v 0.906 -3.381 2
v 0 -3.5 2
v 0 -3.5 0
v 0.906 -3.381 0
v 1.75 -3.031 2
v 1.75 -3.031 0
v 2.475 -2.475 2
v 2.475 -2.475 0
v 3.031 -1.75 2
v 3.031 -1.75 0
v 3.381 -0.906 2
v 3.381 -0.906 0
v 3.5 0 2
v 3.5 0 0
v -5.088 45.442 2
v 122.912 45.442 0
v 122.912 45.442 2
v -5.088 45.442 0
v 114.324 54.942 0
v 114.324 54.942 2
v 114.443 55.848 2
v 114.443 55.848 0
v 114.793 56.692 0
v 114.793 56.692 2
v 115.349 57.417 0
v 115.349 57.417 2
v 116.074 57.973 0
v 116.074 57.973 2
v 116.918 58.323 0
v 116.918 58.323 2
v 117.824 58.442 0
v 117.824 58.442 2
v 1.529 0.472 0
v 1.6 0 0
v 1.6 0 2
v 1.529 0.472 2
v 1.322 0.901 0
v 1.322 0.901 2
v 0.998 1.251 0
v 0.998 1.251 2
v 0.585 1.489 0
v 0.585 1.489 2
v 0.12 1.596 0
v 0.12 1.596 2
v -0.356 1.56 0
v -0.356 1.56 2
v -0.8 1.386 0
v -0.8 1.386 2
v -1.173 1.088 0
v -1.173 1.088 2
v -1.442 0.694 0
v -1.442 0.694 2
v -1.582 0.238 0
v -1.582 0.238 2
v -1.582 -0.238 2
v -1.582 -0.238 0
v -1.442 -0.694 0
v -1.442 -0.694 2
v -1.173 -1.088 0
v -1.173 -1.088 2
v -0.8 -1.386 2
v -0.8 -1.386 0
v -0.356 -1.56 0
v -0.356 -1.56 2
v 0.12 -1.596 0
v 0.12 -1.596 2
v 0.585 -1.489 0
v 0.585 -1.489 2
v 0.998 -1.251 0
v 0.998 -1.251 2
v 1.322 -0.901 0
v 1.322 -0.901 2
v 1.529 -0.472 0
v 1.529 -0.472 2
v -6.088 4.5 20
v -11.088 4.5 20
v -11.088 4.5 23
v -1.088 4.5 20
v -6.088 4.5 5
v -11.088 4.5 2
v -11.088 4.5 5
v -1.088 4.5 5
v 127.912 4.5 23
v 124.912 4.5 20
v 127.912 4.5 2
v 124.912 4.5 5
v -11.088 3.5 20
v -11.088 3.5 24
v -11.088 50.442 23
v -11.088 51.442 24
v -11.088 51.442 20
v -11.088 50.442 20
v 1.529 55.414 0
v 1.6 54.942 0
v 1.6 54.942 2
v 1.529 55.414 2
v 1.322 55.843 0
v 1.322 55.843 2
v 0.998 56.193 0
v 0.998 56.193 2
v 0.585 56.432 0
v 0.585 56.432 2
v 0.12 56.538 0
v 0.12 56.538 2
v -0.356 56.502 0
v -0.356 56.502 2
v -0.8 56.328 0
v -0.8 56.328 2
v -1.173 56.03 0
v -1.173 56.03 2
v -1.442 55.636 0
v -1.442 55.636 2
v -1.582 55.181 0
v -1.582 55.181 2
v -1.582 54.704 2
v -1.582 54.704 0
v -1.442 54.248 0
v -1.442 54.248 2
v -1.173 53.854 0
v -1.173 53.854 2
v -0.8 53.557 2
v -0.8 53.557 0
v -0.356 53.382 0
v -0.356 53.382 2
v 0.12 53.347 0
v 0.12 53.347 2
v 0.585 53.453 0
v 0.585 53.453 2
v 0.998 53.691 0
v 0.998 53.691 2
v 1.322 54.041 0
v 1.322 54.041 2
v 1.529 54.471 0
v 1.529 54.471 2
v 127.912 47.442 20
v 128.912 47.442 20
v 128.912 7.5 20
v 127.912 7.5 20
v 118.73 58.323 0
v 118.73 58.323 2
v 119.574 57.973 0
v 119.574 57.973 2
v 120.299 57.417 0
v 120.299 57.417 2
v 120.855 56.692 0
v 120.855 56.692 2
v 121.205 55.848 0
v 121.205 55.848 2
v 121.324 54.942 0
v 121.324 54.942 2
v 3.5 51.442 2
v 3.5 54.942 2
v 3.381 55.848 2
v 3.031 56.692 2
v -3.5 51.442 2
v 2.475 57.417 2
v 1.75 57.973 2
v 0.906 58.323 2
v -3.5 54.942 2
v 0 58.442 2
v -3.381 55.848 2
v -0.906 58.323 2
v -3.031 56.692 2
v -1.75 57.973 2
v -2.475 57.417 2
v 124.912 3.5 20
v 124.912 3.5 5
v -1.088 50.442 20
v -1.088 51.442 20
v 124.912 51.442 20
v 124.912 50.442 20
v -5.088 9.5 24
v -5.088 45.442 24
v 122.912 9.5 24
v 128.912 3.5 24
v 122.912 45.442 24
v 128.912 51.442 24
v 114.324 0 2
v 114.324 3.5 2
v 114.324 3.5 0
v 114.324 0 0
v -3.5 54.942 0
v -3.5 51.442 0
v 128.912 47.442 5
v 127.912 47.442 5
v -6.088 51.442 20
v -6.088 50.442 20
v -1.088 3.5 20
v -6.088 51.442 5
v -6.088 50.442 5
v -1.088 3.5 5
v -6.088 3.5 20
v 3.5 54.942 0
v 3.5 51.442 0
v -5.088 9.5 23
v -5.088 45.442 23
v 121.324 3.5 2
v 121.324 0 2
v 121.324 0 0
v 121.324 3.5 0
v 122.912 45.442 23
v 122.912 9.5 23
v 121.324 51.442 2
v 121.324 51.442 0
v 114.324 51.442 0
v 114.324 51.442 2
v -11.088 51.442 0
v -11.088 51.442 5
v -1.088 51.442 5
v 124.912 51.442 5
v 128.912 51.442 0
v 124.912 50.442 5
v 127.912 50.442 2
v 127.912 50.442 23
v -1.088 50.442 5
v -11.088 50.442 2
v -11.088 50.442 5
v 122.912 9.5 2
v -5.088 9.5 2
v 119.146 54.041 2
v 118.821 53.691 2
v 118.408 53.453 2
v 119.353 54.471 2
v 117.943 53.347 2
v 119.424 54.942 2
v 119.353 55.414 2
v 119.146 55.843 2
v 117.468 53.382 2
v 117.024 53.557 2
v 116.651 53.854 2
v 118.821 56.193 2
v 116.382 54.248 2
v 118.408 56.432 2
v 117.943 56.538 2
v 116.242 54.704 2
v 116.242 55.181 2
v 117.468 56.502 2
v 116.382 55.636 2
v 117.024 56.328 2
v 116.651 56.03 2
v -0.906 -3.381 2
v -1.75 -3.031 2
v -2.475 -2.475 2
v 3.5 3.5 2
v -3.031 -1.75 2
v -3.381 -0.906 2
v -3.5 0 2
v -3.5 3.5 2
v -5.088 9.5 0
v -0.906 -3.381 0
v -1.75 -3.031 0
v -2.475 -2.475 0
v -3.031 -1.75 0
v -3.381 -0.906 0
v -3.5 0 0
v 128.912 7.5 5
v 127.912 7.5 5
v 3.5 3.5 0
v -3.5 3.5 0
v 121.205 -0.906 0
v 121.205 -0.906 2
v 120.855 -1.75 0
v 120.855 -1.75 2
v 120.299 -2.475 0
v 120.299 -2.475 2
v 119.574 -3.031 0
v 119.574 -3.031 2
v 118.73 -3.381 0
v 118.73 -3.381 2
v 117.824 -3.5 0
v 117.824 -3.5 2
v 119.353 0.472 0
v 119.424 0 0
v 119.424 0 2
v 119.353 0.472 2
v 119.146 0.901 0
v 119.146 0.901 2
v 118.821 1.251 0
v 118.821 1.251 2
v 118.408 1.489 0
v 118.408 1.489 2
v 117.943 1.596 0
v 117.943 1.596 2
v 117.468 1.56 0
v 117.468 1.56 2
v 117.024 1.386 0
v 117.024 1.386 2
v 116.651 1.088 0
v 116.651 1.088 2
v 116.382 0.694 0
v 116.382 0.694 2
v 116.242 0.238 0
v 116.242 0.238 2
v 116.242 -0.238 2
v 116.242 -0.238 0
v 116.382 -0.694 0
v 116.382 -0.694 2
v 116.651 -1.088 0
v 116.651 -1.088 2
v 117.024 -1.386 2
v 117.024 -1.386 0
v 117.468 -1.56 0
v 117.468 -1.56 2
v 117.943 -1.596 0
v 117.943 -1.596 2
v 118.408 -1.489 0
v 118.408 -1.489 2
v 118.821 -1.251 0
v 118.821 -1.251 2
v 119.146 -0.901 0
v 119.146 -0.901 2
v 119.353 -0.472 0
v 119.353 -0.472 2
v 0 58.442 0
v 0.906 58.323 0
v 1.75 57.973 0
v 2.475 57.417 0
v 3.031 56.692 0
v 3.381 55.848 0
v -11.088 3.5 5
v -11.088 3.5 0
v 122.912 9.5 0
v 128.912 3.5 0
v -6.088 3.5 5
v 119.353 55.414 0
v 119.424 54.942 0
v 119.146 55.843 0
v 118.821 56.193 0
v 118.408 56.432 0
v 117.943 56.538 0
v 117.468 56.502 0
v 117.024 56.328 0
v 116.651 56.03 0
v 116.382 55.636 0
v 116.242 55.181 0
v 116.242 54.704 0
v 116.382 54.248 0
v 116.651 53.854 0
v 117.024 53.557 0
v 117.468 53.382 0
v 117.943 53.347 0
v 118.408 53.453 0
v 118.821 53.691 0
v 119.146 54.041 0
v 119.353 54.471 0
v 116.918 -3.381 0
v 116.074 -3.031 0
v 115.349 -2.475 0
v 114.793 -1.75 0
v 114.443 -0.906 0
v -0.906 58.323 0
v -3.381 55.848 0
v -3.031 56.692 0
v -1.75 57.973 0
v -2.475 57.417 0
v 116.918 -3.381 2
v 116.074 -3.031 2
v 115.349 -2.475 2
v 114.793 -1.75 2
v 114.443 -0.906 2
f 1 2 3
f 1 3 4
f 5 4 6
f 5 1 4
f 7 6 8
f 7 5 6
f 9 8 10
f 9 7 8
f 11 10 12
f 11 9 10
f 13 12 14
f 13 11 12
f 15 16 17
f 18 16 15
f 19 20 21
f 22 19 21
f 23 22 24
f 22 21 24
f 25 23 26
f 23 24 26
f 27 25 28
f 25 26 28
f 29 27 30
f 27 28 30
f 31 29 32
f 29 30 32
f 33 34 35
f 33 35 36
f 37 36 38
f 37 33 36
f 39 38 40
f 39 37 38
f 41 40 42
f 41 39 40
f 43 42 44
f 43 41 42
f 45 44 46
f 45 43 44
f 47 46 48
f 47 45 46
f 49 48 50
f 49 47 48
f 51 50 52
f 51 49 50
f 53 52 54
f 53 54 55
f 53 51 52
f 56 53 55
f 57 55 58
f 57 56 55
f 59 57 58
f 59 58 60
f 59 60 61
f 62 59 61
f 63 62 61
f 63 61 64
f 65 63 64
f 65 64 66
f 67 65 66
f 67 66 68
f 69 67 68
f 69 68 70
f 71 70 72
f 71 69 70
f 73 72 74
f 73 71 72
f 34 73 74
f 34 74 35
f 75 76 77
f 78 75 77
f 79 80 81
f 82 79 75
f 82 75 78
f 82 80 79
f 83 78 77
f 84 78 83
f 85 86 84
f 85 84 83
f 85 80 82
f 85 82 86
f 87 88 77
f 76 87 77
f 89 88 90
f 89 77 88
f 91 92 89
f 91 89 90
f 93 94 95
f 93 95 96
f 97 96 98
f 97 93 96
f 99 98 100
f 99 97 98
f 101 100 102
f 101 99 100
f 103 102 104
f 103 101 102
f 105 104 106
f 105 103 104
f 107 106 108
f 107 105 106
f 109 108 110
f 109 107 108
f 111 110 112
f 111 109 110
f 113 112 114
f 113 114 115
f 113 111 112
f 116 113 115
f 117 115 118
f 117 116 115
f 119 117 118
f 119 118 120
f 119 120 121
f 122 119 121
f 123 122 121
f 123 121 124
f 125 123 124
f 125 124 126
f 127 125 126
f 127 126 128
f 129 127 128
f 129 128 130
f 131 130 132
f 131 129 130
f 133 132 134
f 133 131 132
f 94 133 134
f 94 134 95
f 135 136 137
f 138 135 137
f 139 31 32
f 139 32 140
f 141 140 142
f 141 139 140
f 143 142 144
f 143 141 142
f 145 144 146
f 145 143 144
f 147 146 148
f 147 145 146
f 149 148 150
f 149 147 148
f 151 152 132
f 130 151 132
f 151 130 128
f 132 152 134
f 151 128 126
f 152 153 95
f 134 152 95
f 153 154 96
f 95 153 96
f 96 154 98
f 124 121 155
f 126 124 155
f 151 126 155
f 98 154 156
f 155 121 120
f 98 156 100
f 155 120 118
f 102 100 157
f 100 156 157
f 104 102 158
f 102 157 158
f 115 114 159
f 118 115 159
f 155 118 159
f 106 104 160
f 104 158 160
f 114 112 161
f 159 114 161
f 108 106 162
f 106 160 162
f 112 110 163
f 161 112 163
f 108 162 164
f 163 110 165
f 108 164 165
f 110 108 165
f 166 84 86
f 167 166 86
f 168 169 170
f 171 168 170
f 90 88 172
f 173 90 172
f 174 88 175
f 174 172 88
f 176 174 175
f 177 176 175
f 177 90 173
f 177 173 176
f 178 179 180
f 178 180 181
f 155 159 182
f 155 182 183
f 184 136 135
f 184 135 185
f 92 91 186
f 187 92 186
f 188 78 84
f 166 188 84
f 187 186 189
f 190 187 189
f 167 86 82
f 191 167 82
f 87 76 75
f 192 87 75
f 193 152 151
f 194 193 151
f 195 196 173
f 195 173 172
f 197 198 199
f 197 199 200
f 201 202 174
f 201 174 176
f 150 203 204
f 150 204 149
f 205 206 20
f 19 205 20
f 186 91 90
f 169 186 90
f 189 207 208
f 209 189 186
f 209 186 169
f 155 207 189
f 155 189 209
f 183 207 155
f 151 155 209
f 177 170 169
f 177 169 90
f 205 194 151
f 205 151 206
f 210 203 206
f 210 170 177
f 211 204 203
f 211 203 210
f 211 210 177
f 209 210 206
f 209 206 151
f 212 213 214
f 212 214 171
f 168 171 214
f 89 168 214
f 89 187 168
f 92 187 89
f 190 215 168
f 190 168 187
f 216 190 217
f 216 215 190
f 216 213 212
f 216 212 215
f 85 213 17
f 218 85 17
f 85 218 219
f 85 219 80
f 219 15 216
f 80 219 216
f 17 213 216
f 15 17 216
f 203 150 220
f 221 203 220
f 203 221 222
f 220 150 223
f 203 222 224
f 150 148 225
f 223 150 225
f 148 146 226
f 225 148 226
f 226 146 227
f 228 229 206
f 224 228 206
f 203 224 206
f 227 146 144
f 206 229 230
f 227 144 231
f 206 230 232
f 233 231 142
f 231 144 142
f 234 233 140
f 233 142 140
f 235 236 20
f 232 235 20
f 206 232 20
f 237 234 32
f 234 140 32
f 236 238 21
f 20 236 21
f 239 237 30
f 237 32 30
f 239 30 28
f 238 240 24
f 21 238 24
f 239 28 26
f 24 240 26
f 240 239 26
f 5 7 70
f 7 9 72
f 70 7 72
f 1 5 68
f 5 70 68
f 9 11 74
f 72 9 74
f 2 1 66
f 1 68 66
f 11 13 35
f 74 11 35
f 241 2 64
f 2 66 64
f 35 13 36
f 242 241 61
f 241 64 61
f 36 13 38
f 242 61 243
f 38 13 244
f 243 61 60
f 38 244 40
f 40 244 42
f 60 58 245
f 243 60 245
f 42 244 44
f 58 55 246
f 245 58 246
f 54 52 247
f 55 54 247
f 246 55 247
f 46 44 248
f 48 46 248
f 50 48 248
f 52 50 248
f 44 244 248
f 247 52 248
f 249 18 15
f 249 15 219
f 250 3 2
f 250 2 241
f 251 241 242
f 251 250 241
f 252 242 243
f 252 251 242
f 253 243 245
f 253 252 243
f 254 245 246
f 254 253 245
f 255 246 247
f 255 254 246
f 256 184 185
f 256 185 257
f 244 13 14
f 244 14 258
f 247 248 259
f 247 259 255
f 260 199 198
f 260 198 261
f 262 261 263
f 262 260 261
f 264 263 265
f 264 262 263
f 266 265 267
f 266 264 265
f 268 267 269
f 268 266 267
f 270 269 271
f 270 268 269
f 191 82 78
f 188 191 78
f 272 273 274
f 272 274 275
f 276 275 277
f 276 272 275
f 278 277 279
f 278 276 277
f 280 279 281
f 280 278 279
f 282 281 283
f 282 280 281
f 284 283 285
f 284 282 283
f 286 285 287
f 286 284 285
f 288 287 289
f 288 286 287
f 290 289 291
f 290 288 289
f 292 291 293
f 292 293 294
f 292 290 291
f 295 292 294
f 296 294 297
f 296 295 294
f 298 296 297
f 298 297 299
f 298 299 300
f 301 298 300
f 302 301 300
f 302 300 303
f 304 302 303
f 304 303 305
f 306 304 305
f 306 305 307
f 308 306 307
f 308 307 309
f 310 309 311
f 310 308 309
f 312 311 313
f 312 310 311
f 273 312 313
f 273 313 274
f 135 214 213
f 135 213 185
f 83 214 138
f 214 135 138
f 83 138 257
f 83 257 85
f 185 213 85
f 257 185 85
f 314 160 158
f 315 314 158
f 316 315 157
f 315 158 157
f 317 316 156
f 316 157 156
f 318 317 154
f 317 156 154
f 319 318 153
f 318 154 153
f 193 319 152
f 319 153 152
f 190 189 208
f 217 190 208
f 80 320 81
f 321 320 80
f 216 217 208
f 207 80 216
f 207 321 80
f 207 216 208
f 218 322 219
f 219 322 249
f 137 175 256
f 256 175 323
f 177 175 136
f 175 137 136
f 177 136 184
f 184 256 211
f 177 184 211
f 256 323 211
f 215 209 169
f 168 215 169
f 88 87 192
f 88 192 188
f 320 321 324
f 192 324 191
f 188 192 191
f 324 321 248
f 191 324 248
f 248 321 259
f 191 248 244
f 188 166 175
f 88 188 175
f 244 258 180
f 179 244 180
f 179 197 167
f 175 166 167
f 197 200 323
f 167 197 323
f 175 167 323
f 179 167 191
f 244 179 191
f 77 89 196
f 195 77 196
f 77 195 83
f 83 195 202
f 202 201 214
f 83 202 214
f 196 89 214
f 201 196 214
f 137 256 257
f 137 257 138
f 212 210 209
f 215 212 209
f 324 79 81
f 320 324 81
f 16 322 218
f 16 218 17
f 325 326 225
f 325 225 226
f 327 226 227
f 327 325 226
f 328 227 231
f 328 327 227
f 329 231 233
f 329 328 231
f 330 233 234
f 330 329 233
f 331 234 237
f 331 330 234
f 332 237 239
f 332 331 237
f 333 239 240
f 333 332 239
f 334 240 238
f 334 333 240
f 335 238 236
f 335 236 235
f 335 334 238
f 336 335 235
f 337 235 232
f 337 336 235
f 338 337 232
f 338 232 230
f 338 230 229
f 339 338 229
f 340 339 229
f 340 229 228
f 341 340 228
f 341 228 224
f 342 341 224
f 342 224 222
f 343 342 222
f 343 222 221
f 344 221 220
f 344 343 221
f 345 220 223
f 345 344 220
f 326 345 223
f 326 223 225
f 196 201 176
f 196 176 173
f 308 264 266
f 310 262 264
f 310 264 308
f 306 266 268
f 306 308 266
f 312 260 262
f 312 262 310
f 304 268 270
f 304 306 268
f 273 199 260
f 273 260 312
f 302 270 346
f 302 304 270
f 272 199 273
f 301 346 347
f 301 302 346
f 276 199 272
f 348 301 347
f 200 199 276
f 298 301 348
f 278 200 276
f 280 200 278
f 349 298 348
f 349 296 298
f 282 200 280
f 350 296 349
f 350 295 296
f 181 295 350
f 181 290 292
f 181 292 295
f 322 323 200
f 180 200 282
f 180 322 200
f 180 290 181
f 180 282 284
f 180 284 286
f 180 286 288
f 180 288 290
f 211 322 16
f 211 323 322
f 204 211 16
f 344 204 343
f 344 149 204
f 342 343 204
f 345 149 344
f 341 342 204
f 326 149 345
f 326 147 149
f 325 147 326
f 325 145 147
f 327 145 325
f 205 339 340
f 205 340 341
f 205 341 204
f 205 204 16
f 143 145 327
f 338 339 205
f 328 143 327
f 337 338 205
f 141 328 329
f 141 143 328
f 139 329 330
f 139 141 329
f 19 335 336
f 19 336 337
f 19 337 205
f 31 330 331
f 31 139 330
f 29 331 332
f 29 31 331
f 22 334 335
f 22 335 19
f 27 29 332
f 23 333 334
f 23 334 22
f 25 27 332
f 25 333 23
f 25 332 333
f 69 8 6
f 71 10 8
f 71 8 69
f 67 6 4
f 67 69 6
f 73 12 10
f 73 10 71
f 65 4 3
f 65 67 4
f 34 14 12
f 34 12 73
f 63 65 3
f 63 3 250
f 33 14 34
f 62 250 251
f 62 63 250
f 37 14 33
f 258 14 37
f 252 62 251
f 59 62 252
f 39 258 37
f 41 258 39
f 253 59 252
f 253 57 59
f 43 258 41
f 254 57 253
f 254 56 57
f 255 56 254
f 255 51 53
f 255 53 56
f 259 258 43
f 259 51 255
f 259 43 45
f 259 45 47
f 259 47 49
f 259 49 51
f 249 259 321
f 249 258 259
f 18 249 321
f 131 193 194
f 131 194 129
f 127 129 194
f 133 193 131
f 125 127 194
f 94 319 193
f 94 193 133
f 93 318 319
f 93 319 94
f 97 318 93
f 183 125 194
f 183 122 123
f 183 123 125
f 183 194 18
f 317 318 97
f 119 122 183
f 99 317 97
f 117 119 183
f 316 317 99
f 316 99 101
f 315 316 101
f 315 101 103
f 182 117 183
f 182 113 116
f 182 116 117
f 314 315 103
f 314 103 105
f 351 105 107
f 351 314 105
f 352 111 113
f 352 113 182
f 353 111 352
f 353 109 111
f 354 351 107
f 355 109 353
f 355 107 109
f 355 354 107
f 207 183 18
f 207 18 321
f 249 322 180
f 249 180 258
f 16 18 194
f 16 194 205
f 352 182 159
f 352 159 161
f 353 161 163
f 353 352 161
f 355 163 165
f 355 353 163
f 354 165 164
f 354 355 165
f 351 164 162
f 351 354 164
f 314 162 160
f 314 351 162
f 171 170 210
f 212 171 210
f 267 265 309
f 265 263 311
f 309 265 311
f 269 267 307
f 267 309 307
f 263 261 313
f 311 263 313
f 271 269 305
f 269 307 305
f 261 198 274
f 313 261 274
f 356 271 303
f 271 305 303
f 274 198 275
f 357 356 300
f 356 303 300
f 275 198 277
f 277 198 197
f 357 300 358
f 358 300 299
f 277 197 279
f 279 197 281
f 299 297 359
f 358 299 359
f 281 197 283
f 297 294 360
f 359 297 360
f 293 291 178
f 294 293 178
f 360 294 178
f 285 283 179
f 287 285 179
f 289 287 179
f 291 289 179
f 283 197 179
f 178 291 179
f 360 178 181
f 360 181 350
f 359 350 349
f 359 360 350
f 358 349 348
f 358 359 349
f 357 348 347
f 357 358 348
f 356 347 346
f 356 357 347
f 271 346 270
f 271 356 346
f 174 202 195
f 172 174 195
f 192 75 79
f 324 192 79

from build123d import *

# Parameters (mm, degrees)
SKETCH1_R           = 1.6
SKETCH1_R_2         = 2.1
BOSS_EXTRUDE3_DEPTH = 2
BOSS_EXTRUDE4_DEPTH = 2
SKETCH4_W           = 66
SKETCH4_H           = 16.340111315
SKETCH4_H_2         = 24.741581589
CUT_EXTRUDE3_DEPTH  = 14.5
FILLET1_R           = 4
SKETCH5_W           = 26
SKETCH5_H           = 27
SKETCH5_R           = 6
BOSS_EXTRUDE5_DEPTH = 2
SKETCH6_W           = 5
SKETCH6_H           = 27
CUT_EXTRUDE4_DEPTH  = 14.5
SKETCH7_R           = 1.6
SKETCH7_W           = 110.82382425
SKETCH7_H           = 47.94215156
BOSS_EXTRUDE6_DEPTH = 2
SKETCH8_W           = 110.82382425
SKETCH8_H           = 47.94215156
CUT_EXTRUDE5_DEPTH  = 10
BOSS_EXTRUDE7_DEPTH = 2
BOSS_EXTRUDE8_DEPTH = 21
SKETCH11_W          = 140
SKETCH11_H          = 47.94215156
BOSS_EXTRUDE9_DEPTH = 1
CUT_EXTRUDE7_DEPTH  = 13
CUT_EXTRUDE8_DEPTH  = 13
CUT_EXTRUDE9_DEPTH  = 66
CUT_EXTRUDE11_DEPTH = 66
CUT_EXTRUDE12_DEPTH = 66


with BuildPart() as part:
    # Sketch1 → Boss-Extrude3 (new body)
    with BuildSketch(Plane.XY):
        with BuildLine():
            Line((0, 3.5), (37.911912125, 3.5))
            Line((37.911912125, 3.5), (37.911912125, 13.97107578))
            Line((37.911912125, 13.97107578), (37.911912125, 40.97107578))
            Line((37.911912125, 40.97107578), (37.911912125, 51.44215156))
            Line((37.911912125, 51.44215156), (0, 51.44215156))
            ThreePointArc((0, 51.44215156), (-3.5, 54.94215156), (0, 58.44215156))
            Line((0, 58.44215156), (45.911912125, 58.44215156))
            Line((45.911912125, 58.44215156), (45.911912125, 51.44215156))
            Line((45.911912125, 51.44215156), (45.911912125, 48.97107578))
            Line((45.911912125, 48.97107578), (50.911912125, 48.97107578))
            Line((50.911912125, 48.97107578), (66.911912125, 48.97107578))
            Line((66.911912125, 48.97107578), (71.911912125, 48.97107578))
            Line((71.911912125, 48.97107578), (71.911912125, 51.44215156))
            Line((71.911912125, 51.44215156), (71.911912125, 58.44215156))
            Line((71.911912125, 58.44215156), (117.82382425, 58.44215156))
            ThreePointArc((117.82382425, 58.44215156), (121.32382425, 54.94215156), (117.82382425, 51.44215156))
            Line((117.82382425, 51.44215156), (79.911912125, 51.44215156))
            Line((79.911912125, 51.44215156), (79.911912125, 40.97107578))
            Line((79.911912125, 40.97107578), (79.911912125, 13.97107578))
            Line((79.911912125, 13.97107578), (79.911912125, 3.5))
            Line((79.911912125, 3.5), (117.82382425, 3.5))
            ThreePointArc((117.82382425, 3.5), (121.32382425, 0), (117.82382425, -3.5))
            Line((117.82382425, -3.5), (71.911912125, -3.5))
            Line((71.911912125, -3.5), (71.911912125, 3.5))
            Line((71.911912125, 3.5), (71.911912125, 5.97107578))
            Line((71.911912125, 5.97107578), (66.911912125, 5.97107578))
            Line((66.911912125, 5.97107578), (50.911912125, 5.97107578))
            Line((50.911912125, 5.97107578), (45.911912125, 5.97107578))
            Line((45.911912125, 5.97107578), (45.911912125, 3.5))
            Line((45.911912125, 3.5), (45.911912125, -3.5))
            Line((45.911912125, -3.5), (0, -3.5))
            ThreePointArc((0, -3.5), (-3.5, 0), (0, 3.5))
        make_face()
        with Locations((0, 54.94215156)):
            Circle(SKETCH1_R, mode=Mode.SUBTRACT)
        with Locations((117.82382425, 54.94215156)):
            Circle(SKETCH1_R, mode=Mode.SUBTRACT)
        with Locations((117.82382425, 0)):
            Circle(SKETCH1_R, mode=Mode.SUBTRACT)
        Circle(SKETCH1_R, mode=Mode.SUBTRACT)
        with Locations((66.911912125, 44.97107578)):
            Circle(SKETCH1_R_2, mode=Mode.SUBTRACT)
        with Locations((66.911912125, 9.97107578)):
            Circle(SKETCH1_R_2, mode=Mode.SUBTRACT)
        with Locations((50.911912125, 9.97107578)):
            Circle(SKETCH1_R_2, mode=Mode.SUBTRACT)
        with Locations((50.911912125, 44.97107578)):
            Circle(SKETCH1_R_2, mode=Mode.SUBTRACT)
        Polygon((66.911912125, 40.97107578), (50.911912125, 40.97107578), (45.911912125, 40.97107578), (45.911912125, 27.47107578), (45.911912125, 13.97107578), (50.911912125, 13.97107578), (66.911912125, 13.97107578), (71.911912125, 13.97107578), (71.911912125, 27.47107578), (71.911912125, 40.97107578), align=None, mode=Mode.SUBTRACT)
    extrude(amount=BOSS_EXTRUDE3_DEPTH)

    # Sketch3 → Boss-Extrude4 (add)
    with BuildSketch(Plane.XY.offset(2)):
        Polygon((71.911912125, 13.97107578), (99.911912125, 13.97107578), (99.911912125, 3.5), (91.911912125, 3.5), (91.911912125, 5.97107578), (71.911912125, 5.97107578), align=None)
        Polygon((91.911912125, 51.44215156), (99.911912125, 51.44215156), (99.911912125, 40.97107578), (71.911912125, 40.97107578), (71.911912125, 48.97107578), (91.911912125, 48.97107578), align=None)
        Polygon((45.911912125, 40.97107578), (17.911912125, 40.97107578), (17.911912125, 51.44215156), (25.911912125, 51.44215156), (25.911912125, 48.97107578), (45.911912125, 48.97107578), align=None)
        Polygon((25.911912125, 3.5), (17.911912125, 3.5), (17.911912125, 13.97107578), (45.911912125, 13.97107578), (45.911912125, 5.97107578), (25.911912125, 5.97107578), align=None)
    extrude(amount=-BOSS_EXTRUDE4_DEPTH)

    # Sketch4 → Cut-Extrude3 (cut)
    with BuildSketch(Plane.XY.offset(2)):
        with Locations((58.911912125, 57.141131438)):
            Rectangle(SKETCH4_W, SKETCH4_H)
        with Locations((58.911912125, -6.399715014)):
            Rectangle(SKETCH4_W, SKETCH4_H_2)
    extrude(amount=-CUT_EXTRUDE3_DEPTH, mode=Mode.SUBTRACT)

    # Fillet1
    fillet1_edges = [part.edges().sort_by_distance(p)[0] for p in [
        (99.911912125, 13.97107578, 1),
        (99.911912125, 3.5, 1),
        (91.911912125, 5.97107578, 1),
        (91.911912125, 48.97107578, 1),
        (99.911912125, 51.44215156, 1),
        (99.911912125, 40.97107578, 1),
        (17.911912125, 40.97107578, 1),
        (17.911912125, 51.44215156, 1),
        (25.911912125, 48.97107578, 1),
        (25.911912125, 5.97107578, 1),
        (17.911912125, 3.5, 1),
        (17.911912125, 13.97107578, 1),
        (91.911912125, 58.44215156, 1),
        (25.911912125, 58.44215156, 1),
        (91.911912125, -3.5, 1),
        (25.911912125, -3.5, 1),
    ]]
    fillet(fillet1_edges, radius=FILLET1_R)

    # Sketch5 → Boss-Extrude5 (add)
    with BuildSketch(Plane.XY.offset(2)):
        with Locations((58.911912125, 27.47107578)):
            Rectangle(SKETCH5_W, SKETCH5_H)
        with Locations((58.911912125, 27.47107578)):
            Circle(SKETCH5_R, mode=Mode.SUBTRACT)
    extrude(amount=-BOSS_EXTRUDE5_DEPTH)

    # Sketch6 → Cut-Extrude4 (cut)
    with BuildSketch(Plane.XY.offset(2)):
        with Locations((40.411912125, 27.47107578)):
            Rectangle(SKETCH6_W, SKETCH6_H)
        with Locations((77.411912125, 27.47107578)):
            Rectangle(SKETCH6_W, SKETCH6_H)
    extrude(amount=-CUT_EXTRUDE4_DEPTH, mode=Mode.SUBTRACT)

    # Sketch7 → Boss-Extrude6 (add)
    with BuildSketch(Plane.XY.offset(2)):
        with BuildLine():
            Line((-3.5, 54.94215156), (-3.5, 0))
            ThreePointArc((-3.5, 0), (-2.474873734, -2.474873734), (0, -3.5))
            Line((0, -3.5), (117.82382425, -3.5))
            ThreePointArc((117.82382425, -3.5), (120.298697984, -2.474873734), (121.32382425, 0))
            Line((121.32382425, 0), (121.32382425, 54.94215156))
            ThreePointArc((121.32382425, 54.94215156), (120.298697984, 57.417025294), (117.82382425, 58.44215156))
            Line((117.82382425, 58.44215156), (0, 58.44215156))
            ThreePointArc((0, 58.44215156), (-2.474873734, 57.417025294), (-3.5, 54.94215156))
        make_face()
        Circle(SKETCH7_R, mode=Mode.SUBTRACT)
        with Locations((117.82382425, 0)):
            Circle(SKETCH7_R, mode=Mode.SUBTRACT)
        with Locations((117.82382425, 54.94215156)):
            Circle(SKETCH7_R, mode=Mode.SUBTRACT)
        with Locations((0, 54.94215156)):
            Circle(SKETCH7_R, mode=Mode.SUBTRACT)
        with Locations((58.911912125, 27.47107578)):
            Rectangle(SKETCH7_W, SKETCH7_H, mode=Mode.SUBTRACT)
    extrude(amount=-BOSS_EXTRUDE6_DEPTH)

    # Sketch8 → Cut-Extrude5 (cut)
    with BuildSketch(Plane.XY.offset(2)):
        with Locations((58.911912125, 27.47107578)):
            Rectangle(SKETCH8_W, SKETCH8_H)
    extrude(amount=-CUT_EXTRUDE5_DEPTH, mode=Mode.SUBTRACT)

    # Sketch9 → Boss-Extrude7 (add)
    with BuildSketch(Plane.XY.offset(2)):
        Polygon((58.911912125, 51.44215156), (128.911912125, 51.44215156), (128.911912125, 3.5), (-11.088087875, 3.5), (-11.088087875, 51.44215156), align=None)
    extrude(amount=-BOSS_EXTRUDE7_DEPTH)

    # Sketch10 → Boss-Extrude8 (add)
    with BuildSketch(Plane.XY.offset(2)):
        Polygon((-11.088087875, 51.44215156), (128.911912125, 51.44215156), (128.911912125, 3.5), (-11.088087875, 3.5), (-11.088087875, 4.5), (127.911912125, 4.5), (127.911912125, 27.47107578), (127.911912125, 50.44215156), (-11.088087875, 50.44215156), align=None)
    extrude(amount=BOSS_EXTRUDE8_DEPTH)

    # Sketch11 → Boss-Extrude9 (add)
    with BuildSketch(Plane.XY.offset(23)):
        with Locations((58.911912125, 27.47107578)):
            Rectangle(SKETCH11_W, SKETCH11_H)
    extrude(amount=BOSS_EXTRUDE9_DEPTH)

    # Sketch12 → Cut-Extrude7 (cut)
    with BuildSketch(Plane.XY.offset(2)):
        with BuildLine():
            Line((3.5, 0), (3.5, 3.5))
            Line((3.5, 3.5), (114.32382425, 3.5))
            Line((114.32382425, 3.5), (114.32382425, 0))
            ThreePointArc((114.32382425, 0), (115.348950516, -2.474873734), (117.82382425, -3.5))
            Line((117.82382425, -3.5), (0, -3.5))
            ThreePointArc((0, -3.5), (2.474873734, -2.474873734), (3.5, 0))
        make_face()
        with BuildLine():
            Line((3.5, 54.94215156), (3.5, 51.44215156))
            Line((3.5, 51.44215156), (114.32382425, 51.44215156))
            Line((114.32382425, 51.44215156), (114.32382425, 54.94215156))
            ThreePointArc((114.32382425, 54.94215156), (115.348950516, 57.417025294), (117.82382425, 58.44215156))
            Line((117.82382425, 58.44215156), (0, 58.44215156))
            ThreePointArc((0, 58.44215156), (2.474873734, 57.417025294), (3.5, 54.94215156))
        make_face()
    extrude(amount=-CUT_EXTRUDE7_DEPTH, mode=Mode.SUBTRACT)

    # Sketch13 → Cut-Extrude8 (cut)
    with BuildSketch(Plane(origin=(128.911912125, 0, 0), x_dir=(0, 0, -1), z_dir=(1, 0, 0))):
        Polygon((-20, 27.47107578), (-20, 47.44215156), (-5, 47.44215156), (-5, 7.5), (-20, 7.5), align=None)
    extrude(amount=-CUT_EXTRUDE8_DEPTH, mode=Mode.SUBTRACT)

    # Sketch14 → Cut-Extrude9 (cut)
    with BuildSketch(Plane(origin=(0, 0, 0), x_dir=(-1, 0, 0), z_dir=(0, 0, -1))):
        Polygon((-58.911912125, 9.5), (-122.911912125, 9.5), (-122.911912125, 45.44215156), (5.088087875, 45.44215156), (5.088087875, 9.5), align=None)
    extrude(amount=-CUT_EXTRUDE9_DEPTH, mode=Mode.SUBTRACT)

    # Sketch15 → Cut-Extrude11 (cut)
    with BuildSketch(Plane(origin=(0, 51.44215156, 0), x_dir=(1, 0, 0), z_dir=(0, 1, 0))):
        Polygon((-1.088087875, -5), (-1.088087875, -12), (-1.088087875, -20), (124.911912125, -20), (124.911912125, -5), (58.911912125, -5), align=None)
    extrude(amount=-CUT_EXTRUDE11_DEPTH, mode=Mode.SUBTRACT)

    # Sketch16 → Cut-Extrude12 (cut)
    with BuildSketch(Plane(origin=(0, 51.44215156, 0), x_dir=(1, 0, 0), z_dir=(0, 1, 0))):
        Polygon((-6.088087875, -12), (-6.088087875, -5), (-11.088087875, -5), (-11.088087875, -20), (-6.088087875, -20), align=None)
    extrude(amount=-CUT_EXTRUDE12_DEPTH, mode=Mode.SUBTRACT)


solid = part.part
